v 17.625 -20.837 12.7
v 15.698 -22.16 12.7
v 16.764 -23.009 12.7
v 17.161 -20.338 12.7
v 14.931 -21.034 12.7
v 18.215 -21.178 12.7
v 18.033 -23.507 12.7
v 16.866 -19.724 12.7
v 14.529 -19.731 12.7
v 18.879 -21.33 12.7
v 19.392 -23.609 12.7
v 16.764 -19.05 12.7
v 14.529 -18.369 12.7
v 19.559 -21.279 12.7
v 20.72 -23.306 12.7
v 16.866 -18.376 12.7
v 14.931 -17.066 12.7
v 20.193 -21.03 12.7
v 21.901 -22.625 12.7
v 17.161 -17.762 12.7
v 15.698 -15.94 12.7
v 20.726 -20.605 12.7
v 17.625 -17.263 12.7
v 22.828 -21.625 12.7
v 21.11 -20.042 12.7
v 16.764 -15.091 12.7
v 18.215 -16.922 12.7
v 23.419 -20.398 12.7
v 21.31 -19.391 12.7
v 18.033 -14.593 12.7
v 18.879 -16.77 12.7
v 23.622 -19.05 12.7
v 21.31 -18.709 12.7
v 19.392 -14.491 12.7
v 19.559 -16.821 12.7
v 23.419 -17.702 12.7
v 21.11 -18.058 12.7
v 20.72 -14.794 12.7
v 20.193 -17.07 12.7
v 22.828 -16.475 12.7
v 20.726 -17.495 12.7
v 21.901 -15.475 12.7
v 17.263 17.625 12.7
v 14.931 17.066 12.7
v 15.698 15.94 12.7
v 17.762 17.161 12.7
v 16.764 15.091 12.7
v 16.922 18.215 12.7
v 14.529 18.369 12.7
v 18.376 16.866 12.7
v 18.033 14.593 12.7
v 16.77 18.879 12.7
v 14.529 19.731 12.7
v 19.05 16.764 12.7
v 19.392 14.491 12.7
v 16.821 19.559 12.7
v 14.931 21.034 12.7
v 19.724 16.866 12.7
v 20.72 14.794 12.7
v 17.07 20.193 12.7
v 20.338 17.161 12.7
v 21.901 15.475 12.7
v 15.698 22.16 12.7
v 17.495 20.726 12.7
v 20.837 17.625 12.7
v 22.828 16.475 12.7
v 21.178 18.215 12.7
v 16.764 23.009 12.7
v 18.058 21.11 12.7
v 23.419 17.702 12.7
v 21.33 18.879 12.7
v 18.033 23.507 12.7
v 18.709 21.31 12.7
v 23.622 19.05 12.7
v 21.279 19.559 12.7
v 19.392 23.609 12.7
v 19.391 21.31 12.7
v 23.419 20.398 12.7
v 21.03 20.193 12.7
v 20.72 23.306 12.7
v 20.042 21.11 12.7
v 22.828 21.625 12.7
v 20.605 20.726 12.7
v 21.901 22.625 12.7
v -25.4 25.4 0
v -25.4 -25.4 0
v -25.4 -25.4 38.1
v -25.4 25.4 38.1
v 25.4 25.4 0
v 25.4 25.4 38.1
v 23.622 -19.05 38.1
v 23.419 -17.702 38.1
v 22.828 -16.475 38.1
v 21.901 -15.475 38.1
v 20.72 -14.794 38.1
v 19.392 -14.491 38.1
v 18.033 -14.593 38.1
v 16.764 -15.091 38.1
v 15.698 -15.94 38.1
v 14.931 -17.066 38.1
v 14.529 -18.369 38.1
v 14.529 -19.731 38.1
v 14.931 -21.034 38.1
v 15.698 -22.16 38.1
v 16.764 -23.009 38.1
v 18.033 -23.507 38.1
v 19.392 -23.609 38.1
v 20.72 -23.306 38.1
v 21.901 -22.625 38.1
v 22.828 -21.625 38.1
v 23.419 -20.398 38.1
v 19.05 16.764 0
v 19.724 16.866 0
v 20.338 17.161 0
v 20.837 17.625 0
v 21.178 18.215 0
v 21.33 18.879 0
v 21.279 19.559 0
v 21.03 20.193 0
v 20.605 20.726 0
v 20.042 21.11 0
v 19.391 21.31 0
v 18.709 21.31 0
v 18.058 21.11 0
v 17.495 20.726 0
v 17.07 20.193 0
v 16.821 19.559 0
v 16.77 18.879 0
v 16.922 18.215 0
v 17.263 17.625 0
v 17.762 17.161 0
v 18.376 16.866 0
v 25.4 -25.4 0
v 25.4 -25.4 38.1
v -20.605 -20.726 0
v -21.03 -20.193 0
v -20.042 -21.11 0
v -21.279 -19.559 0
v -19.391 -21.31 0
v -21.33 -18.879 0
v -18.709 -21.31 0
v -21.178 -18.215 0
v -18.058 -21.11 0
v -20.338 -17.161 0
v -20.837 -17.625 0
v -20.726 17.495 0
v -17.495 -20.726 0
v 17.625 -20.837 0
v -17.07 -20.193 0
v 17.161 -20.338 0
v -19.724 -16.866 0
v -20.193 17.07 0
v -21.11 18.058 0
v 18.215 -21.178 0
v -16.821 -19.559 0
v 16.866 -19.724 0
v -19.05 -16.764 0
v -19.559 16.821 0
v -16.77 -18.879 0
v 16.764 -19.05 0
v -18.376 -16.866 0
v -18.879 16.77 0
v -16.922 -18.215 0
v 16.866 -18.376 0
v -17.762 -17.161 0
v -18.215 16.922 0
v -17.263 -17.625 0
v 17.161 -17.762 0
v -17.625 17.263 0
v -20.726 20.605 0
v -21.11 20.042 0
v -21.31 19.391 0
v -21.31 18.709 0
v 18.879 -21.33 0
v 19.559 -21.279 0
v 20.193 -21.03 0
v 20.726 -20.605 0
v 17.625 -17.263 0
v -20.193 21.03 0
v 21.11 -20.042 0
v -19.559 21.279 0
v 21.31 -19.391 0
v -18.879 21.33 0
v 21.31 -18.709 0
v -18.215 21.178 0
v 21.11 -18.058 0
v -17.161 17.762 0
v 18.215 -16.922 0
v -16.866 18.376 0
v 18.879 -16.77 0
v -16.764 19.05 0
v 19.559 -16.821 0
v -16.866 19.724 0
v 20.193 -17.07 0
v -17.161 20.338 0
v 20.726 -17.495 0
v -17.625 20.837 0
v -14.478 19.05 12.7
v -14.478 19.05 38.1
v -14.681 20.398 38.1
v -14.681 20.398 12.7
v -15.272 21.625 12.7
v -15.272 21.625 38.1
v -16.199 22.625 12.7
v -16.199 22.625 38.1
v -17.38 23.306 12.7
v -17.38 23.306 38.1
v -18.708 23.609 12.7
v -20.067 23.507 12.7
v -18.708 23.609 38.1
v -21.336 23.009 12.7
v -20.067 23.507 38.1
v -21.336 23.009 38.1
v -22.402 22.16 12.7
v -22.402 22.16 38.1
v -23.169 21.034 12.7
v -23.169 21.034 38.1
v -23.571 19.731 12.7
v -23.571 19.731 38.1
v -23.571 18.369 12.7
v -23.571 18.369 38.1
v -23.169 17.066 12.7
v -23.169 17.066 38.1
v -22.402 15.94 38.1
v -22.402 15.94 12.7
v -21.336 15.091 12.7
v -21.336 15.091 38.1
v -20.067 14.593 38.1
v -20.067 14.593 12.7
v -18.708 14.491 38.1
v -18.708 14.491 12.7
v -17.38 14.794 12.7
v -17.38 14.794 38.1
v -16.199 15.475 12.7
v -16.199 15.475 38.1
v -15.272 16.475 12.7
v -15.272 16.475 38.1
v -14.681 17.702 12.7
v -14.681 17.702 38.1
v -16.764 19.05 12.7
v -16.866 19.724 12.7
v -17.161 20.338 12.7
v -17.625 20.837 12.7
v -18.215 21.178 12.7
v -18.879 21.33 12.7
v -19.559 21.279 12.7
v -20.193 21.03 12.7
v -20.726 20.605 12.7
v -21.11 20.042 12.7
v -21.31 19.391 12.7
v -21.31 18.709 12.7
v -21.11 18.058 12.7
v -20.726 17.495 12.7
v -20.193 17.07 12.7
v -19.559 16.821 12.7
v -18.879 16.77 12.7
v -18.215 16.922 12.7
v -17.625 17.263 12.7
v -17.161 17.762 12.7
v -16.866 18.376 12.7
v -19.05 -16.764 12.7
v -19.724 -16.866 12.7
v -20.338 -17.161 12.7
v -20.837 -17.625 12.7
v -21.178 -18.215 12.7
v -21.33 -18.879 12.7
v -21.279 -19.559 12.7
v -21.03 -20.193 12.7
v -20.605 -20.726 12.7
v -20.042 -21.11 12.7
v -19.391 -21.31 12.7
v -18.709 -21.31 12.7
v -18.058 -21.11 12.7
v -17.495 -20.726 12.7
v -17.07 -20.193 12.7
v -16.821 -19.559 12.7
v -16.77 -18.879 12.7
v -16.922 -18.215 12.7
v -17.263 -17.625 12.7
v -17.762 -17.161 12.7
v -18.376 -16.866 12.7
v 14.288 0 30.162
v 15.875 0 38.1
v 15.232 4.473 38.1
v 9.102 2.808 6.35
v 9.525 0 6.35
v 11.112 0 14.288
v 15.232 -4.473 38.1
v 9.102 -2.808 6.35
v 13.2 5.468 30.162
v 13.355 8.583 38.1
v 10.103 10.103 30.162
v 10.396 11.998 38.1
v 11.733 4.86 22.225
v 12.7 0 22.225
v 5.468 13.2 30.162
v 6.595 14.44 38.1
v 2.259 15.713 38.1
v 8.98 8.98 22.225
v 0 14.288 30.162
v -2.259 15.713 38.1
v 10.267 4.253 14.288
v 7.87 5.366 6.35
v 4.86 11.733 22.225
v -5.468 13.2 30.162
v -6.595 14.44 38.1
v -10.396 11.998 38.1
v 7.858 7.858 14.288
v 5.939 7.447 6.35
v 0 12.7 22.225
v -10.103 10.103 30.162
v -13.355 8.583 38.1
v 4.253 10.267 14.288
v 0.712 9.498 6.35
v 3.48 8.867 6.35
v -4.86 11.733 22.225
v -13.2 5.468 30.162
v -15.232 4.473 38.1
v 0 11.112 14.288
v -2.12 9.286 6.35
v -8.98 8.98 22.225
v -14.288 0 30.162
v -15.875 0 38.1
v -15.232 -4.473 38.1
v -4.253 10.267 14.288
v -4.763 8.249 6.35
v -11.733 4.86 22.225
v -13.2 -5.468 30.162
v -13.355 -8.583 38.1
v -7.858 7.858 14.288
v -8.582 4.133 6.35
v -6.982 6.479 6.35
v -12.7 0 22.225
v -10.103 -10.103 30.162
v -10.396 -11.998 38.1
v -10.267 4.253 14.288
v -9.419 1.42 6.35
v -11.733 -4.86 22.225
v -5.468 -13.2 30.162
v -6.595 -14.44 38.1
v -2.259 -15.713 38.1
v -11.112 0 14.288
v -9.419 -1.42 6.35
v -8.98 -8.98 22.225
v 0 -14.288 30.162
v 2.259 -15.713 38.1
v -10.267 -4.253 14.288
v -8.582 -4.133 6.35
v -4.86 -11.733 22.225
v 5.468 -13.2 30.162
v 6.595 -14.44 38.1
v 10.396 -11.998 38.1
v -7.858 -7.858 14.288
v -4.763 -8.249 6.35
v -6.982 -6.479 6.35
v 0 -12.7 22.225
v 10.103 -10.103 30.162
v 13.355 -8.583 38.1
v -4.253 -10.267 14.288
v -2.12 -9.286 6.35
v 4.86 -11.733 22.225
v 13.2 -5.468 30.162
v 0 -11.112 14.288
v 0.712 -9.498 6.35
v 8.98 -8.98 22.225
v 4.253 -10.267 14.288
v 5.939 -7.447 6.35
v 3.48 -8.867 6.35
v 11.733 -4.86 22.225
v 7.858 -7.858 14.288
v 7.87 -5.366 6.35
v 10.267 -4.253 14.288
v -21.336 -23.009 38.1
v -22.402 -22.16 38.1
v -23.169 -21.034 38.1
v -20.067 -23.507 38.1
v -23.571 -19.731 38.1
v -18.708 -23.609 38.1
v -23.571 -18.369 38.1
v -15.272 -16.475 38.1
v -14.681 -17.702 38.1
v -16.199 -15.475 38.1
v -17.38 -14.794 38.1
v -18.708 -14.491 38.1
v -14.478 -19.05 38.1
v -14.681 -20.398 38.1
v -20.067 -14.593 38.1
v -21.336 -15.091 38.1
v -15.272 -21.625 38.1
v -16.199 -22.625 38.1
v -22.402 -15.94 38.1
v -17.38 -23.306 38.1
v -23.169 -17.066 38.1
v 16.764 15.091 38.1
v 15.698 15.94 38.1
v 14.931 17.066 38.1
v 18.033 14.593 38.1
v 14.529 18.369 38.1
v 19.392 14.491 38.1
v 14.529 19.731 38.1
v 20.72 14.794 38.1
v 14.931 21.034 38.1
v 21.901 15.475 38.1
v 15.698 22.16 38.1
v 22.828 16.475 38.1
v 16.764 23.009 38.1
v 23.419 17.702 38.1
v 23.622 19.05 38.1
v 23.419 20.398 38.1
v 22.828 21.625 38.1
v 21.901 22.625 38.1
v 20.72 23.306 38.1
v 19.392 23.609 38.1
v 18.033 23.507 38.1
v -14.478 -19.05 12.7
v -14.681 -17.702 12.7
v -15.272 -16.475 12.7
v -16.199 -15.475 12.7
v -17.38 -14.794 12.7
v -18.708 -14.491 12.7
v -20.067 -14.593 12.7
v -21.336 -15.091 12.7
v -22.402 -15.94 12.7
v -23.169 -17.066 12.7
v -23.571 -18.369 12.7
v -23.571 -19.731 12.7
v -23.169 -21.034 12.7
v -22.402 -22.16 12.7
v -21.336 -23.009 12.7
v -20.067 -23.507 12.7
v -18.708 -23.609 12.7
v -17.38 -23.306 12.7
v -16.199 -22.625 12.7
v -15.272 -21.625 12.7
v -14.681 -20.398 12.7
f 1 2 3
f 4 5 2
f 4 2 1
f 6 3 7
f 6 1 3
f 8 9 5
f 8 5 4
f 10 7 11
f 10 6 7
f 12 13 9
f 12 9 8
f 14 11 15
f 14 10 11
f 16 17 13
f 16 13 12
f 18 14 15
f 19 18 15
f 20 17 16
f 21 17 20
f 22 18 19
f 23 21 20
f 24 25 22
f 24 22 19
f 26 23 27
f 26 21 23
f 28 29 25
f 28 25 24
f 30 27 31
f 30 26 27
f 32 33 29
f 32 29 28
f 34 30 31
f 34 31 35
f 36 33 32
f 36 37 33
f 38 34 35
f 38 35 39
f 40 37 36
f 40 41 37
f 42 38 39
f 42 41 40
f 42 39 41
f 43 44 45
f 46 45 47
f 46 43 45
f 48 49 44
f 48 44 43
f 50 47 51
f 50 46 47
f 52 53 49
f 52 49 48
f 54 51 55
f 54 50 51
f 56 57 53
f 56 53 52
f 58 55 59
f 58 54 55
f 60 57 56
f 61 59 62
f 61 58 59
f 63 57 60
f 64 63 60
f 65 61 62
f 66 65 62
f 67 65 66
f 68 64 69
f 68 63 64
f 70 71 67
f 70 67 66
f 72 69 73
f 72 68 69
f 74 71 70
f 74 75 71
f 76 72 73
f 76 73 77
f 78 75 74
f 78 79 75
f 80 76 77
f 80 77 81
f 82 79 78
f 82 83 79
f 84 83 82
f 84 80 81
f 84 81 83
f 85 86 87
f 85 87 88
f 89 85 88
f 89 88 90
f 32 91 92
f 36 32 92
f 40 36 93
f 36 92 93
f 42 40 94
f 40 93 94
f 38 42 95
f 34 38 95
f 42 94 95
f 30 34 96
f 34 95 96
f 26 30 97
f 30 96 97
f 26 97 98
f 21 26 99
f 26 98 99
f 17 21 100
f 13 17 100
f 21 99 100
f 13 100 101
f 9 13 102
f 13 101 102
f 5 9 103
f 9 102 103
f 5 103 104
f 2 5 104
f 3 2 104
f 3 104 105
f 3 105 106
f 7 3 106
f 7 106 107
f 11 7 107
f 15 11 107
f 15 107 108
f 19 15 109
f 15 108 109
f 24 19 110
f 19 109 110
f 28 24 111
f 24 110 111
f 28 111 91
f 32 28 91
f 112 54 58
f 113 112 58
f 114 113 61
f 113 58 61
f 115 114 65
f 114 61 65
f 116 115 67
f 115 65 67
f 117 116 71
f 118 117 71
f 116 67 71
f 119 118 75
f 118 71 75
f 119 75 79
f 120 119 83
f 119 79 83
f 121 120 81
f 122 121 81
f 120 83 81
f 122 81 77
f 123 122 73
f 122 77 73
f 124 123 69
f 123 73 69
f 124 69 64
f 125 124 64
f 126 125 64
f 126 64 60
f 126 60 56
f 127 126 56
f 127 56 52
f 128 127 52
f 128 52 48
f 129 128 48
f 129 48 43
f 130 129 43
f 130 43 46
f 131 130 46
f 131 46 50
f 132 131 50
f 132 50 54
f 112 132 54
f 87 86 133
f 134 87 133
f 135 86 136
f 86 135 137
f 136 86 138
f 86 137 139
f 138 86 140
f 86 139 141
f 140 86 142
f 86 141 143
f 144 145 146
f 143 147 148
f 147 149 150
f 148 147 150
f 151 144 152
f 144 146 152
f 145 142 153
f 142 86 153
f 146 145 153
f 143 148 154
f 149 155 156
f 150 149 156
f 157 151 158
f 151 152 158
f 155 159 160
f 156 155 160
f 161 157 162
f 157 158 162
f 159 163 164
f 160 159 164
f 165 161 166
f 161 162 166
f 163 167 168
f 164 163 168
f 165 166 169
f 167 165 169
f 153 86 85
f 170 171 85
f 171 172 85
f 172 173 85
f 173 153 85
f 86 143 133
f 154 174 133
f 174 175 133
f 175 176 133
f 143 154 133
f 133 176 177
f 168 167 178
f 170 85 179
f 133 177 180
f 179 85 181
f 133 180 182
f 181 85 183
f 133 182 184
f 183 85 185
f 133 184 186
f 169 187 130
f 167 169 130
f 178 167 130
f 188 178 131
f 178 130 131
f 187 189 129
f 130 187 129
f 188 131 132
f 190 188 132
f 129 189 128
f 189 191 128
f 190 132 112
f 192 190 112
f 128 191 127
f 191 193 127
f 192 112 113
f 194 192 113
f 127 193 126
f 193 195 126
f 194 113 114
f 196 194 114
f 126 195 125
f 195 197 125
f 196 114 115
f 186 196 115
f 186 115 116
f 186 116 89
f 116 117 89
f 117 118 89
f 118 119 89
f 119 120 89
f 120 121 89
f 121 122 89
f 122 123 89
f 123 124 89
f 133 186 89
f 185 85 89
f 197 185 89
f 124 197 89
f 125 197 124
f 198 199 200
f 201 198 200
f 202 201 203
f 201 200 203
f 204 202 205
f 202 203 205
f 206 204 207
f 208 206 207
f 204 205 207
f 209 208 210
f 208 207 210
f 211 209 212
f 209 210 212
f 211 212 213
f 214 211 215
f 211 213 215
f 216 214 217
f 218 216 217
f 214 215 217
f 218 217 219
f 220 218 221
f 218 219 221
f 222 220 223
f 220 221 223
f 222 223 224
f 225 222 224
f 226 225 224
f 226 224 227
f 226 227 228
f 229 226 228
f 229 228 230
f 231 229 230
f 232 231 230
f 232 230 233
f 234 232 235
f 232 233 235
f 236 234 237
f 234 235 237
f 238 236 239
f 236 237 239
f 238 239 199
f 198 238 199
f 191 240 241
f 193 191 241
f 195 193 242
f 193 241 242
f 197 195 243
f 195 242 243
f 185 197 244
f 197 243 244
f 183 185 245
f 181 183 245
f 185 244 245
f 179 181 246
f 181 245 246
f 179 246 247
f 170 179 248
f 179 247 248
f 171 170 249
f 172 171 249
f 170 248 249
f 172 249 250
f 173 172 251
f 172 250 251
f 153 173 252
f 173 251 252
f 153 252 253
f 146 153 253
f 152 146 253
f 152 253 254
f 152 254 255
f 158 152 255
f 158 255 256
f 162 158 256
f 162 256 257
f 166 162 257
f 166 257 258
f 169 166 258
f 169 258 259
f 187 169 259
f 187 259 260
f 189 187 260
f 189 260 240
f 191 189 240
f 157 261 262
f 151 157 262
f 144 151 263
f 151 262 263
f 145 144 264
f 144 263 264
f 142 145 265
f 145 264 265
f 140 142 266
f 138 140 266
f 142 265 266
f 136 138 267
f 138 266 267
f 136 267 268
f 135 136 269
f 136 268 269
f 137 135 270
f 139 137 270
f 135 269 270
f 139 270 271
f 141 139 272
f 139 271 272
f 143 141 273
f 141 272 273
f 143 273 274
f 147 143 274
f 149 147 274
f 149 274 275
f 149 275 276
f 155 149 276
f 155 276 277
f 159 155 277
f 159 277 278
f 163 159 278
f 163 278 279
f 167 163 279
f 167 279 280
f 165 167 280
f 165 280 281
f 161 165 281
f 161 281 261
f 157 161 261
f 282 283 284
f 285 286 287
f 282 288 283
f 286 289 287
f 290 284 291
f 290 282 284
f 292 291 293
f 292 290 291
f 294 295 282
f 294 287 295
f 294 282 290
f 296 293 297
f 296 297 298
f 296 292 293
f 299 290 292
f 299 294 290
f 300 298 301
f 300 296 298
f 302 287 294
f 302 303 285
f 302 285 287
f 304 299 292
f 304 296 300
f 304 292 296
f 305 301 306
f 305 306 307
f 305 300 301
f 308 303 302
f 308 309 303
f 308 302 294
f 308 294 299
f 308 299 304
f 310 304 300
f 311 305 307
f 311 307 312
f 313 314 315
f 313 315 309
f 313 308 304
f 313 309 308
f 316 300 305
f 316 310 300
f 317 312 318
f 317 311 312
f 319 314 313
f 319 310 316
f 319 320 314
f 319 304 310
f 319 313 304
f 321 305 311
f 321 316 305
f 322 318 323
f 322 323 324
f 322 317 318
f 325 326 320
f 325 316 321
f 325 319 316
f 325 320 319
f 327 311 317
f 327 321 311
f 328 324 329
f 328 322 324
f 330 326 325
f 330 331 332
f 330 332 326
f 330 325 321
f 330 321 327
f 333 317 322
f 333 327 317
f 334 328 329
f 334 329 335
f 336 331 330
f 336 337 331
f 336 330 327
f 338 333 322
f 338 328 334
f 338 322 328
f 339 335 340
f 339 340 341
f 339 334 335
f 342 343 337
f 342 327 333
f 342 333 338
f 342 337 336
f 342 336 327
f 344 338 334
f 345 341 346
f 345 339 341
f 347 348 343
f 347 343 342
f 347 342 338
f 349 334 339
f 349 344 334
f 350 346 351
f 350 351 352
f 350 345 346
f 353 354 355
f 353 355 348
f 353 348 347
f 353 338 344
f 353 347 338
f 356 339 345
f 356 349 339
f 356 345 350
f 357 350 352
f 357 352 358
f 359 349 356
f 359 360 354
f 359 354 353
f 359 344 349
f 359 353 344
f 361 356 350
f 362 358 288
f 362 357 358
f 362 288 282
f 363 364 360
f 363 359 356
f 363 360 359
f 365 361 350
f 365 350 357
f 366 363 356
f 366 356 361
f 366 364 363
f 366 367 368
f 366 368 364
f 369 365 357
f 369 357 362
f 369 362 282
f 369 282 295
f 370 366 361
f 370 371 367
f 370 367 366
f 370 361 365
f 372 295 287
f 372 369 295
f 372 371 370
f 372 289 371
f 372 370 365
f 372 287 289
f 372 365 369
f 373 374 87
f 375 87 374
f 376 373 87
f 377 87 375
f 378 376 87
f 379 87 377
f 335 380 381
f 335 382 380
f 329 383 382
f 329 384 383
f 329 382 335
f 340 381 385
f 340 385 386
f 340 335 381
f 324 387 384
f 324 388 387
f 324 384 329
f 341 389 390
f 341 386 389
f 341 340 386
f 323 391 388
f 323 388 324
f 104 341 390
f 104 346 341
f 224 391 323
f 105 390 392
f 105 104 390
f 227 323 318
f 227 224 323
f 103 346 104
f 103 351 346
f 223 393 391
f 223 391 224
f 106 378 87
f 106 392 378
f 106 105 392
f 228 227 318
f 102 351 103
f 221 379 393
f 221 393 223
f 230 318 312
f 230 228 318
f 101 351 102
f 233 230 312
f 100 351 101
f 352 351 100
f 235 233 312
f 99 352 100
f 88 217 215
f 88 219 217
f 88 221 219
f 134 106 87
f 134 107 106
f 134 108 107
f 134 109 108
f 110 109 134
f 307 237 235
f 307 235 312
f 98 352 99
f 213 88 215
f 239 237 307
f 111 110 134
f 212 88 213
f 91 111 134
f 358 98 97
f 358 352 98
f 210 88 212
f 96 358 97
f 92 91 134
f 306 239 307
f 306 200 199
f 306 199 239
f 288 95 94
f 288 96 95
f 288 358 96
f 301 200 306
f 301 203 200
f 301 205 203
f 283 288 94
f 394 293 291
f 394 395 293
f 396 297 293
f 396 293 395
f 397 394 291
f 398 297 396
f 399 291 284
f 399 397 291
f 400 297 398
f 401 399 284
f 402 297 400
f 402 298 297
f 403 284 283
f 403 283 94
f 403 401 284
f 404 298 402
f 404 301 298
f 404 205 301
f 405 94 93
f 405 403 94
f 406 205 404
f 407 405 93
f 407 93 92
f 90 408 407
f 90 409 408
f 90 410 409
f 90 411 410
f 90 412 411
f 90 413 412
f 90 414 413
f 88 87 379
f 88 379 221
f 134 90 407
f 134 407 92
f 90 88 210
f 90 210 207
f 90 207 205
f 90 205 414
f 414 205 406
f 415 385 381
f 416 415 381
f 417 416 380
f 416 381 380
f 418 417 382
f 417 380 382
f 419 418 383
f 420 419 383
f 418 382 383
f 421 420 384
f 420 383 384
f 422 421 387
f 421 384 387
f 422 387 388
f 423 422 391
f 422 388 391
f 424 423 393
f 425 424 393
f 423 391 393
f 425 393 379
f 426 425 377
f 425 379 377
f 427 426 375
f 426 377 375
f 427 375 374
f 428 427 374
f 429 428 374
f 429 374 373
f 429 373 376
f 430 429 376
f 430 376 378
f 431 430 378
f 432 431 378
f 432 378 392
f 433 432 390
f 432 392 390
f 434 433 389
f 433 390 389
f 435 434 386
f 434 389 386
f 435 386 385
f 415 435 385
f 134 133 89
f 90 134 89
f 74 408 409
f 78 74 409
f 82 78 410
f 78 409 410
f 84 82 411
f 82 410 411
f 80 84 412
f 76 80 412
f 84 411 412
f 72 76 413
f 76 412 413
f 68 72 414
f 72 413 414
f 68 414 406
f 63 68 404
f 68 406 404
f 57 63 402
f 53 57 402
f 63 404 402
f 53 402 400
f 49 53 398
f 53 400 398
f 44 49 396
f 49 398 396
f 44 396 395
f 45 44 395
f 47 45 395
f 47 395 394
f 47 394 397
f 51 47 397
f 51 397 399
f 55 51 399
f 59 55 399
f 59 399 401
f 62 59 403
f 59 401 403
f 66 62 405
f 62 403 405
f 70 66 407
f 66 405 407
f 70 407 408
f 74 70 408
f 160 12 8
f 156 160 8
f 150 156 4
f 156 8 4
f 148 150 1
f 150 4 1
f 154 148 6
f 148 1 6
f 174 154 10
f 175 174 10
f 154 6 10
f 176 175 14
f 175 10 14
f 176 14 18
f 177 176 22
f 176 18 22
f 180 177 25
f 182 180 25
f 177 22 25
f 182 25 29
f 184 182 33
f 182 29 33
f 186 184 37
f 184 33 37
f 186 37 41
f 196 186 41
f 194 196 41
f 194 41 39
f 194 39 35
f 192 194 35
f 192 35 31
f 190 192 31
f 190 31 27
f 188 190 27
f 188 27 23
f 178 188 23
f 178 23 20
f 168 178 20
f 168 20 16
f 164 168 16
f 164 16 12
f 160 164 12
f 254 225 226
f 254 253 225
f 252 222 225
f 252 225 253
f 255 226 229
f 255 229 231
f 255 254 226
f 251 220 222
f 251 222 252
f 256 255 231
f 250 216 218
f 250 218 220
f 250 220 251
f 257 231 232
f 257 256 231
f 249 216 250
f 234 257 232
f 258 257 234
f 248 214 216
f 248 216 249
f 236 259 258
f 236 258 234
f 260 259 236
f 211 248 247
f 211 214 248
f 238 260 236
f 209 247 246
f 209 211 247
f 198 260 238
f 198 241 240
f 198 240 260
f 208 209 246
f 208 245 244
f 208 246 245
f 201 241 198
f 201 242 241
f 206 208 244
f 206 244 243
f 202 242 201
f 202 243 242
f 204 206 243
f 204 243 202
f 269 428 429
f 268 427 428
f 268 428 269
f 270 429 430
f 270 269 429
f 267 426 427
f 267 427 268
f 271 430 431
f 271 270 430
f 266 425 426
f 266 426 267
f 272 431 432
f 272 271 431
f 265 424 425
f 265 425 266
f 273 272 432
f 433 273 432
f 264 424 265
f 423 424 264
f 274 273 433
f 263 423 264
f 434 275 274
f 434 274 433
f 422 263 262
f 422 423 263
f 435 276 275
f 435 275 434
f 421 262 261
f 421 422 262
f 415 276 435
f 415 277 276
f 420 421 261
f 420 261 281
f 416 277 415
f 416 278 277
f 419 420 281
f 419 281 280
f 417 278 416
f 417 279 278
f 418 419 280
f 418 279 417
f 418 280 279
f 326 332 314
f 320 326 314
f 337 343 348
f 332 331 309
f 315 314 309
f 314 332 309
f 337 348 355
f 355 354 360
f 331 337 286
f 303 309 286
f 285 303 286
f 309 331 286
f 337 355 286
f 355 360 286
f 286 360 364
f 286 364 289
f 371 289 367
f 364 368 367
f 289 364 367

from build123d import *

# Parameters (mm, degrees)
F0_W             = 50.8
F0_H             = 50.8
F1_DEPTH         = 38.1
F2_R             = 15.875
F4_R             = 9.525
F6_R             = 4.572
F7_DEPTH         = 25.4
F9_R             = 2.286
F10_DEPTH        = 12.701
F10_COPIES_COUNT = 4


# Not quite as in the source:
# - a pattern or mirror of a feature is missing from the dataset's text; its kind, count and spacing are read off the source's solid


with BuildPart() as f1:
    # F0 (on Top) → F1 (new body)
    with BuildSketch(Plane.XY):
        Rectangle(F0_W, F0_H)
    extrude(amount=F1_DEPTH)

    # F2 (on face) → F5 section 0
    with BuildSketch(Plane.XY.offset(38.1)):
        Circle(F2_R)
    # F4 (on offset) → F5 section 1
    with BuildSketch(Plane(origin=(0, 0, 6.35), x_dir=(1, 0, 0), z_dir=(0, 0, -1))):
        Circle(F4_R)
    loft(mode=Mode.SUBTRACT)

    # F6 (on face) → F7 (cut)
    with BuildSketch(Plane.XY.offset(38.1)):
        with Locations((19.05, -19.05)):
            Circle(F6_R)
        with Locations((19.05, 19.05)):
            Circle(F6_R)
        with Locations((-19.05, 19.05)):
            Circle(F6_R)
        with Locations((-19.05, -19.05)):
            Circle(F6_R)
    extrude(amount=-F7_DEPTH, mode=Mode.SUBTRACT)

    # F9 (on offset) → F10 (cut, through all)
    with BuildSketch(Plane.XY.offset(12.7)):
        with Locations((-19.05, 19.05)):
            Circle(F9_R)
    f10 = extrude(amount=-F10_DEPTH, mode=Mode.SUBTRACT)

    # F10_copies: F10 ×4 about axis
    f10_copies_axis = Axis((0, 0, 0), (0, 0, 1))
    for i in range(1, F10_COPIES_COUNT):
        add(f10.rotate(f10_copies_axis, i * 360 / F10_COPIES_COUNT), mode=Mode.SUBTRACT)


solid = f1.part
